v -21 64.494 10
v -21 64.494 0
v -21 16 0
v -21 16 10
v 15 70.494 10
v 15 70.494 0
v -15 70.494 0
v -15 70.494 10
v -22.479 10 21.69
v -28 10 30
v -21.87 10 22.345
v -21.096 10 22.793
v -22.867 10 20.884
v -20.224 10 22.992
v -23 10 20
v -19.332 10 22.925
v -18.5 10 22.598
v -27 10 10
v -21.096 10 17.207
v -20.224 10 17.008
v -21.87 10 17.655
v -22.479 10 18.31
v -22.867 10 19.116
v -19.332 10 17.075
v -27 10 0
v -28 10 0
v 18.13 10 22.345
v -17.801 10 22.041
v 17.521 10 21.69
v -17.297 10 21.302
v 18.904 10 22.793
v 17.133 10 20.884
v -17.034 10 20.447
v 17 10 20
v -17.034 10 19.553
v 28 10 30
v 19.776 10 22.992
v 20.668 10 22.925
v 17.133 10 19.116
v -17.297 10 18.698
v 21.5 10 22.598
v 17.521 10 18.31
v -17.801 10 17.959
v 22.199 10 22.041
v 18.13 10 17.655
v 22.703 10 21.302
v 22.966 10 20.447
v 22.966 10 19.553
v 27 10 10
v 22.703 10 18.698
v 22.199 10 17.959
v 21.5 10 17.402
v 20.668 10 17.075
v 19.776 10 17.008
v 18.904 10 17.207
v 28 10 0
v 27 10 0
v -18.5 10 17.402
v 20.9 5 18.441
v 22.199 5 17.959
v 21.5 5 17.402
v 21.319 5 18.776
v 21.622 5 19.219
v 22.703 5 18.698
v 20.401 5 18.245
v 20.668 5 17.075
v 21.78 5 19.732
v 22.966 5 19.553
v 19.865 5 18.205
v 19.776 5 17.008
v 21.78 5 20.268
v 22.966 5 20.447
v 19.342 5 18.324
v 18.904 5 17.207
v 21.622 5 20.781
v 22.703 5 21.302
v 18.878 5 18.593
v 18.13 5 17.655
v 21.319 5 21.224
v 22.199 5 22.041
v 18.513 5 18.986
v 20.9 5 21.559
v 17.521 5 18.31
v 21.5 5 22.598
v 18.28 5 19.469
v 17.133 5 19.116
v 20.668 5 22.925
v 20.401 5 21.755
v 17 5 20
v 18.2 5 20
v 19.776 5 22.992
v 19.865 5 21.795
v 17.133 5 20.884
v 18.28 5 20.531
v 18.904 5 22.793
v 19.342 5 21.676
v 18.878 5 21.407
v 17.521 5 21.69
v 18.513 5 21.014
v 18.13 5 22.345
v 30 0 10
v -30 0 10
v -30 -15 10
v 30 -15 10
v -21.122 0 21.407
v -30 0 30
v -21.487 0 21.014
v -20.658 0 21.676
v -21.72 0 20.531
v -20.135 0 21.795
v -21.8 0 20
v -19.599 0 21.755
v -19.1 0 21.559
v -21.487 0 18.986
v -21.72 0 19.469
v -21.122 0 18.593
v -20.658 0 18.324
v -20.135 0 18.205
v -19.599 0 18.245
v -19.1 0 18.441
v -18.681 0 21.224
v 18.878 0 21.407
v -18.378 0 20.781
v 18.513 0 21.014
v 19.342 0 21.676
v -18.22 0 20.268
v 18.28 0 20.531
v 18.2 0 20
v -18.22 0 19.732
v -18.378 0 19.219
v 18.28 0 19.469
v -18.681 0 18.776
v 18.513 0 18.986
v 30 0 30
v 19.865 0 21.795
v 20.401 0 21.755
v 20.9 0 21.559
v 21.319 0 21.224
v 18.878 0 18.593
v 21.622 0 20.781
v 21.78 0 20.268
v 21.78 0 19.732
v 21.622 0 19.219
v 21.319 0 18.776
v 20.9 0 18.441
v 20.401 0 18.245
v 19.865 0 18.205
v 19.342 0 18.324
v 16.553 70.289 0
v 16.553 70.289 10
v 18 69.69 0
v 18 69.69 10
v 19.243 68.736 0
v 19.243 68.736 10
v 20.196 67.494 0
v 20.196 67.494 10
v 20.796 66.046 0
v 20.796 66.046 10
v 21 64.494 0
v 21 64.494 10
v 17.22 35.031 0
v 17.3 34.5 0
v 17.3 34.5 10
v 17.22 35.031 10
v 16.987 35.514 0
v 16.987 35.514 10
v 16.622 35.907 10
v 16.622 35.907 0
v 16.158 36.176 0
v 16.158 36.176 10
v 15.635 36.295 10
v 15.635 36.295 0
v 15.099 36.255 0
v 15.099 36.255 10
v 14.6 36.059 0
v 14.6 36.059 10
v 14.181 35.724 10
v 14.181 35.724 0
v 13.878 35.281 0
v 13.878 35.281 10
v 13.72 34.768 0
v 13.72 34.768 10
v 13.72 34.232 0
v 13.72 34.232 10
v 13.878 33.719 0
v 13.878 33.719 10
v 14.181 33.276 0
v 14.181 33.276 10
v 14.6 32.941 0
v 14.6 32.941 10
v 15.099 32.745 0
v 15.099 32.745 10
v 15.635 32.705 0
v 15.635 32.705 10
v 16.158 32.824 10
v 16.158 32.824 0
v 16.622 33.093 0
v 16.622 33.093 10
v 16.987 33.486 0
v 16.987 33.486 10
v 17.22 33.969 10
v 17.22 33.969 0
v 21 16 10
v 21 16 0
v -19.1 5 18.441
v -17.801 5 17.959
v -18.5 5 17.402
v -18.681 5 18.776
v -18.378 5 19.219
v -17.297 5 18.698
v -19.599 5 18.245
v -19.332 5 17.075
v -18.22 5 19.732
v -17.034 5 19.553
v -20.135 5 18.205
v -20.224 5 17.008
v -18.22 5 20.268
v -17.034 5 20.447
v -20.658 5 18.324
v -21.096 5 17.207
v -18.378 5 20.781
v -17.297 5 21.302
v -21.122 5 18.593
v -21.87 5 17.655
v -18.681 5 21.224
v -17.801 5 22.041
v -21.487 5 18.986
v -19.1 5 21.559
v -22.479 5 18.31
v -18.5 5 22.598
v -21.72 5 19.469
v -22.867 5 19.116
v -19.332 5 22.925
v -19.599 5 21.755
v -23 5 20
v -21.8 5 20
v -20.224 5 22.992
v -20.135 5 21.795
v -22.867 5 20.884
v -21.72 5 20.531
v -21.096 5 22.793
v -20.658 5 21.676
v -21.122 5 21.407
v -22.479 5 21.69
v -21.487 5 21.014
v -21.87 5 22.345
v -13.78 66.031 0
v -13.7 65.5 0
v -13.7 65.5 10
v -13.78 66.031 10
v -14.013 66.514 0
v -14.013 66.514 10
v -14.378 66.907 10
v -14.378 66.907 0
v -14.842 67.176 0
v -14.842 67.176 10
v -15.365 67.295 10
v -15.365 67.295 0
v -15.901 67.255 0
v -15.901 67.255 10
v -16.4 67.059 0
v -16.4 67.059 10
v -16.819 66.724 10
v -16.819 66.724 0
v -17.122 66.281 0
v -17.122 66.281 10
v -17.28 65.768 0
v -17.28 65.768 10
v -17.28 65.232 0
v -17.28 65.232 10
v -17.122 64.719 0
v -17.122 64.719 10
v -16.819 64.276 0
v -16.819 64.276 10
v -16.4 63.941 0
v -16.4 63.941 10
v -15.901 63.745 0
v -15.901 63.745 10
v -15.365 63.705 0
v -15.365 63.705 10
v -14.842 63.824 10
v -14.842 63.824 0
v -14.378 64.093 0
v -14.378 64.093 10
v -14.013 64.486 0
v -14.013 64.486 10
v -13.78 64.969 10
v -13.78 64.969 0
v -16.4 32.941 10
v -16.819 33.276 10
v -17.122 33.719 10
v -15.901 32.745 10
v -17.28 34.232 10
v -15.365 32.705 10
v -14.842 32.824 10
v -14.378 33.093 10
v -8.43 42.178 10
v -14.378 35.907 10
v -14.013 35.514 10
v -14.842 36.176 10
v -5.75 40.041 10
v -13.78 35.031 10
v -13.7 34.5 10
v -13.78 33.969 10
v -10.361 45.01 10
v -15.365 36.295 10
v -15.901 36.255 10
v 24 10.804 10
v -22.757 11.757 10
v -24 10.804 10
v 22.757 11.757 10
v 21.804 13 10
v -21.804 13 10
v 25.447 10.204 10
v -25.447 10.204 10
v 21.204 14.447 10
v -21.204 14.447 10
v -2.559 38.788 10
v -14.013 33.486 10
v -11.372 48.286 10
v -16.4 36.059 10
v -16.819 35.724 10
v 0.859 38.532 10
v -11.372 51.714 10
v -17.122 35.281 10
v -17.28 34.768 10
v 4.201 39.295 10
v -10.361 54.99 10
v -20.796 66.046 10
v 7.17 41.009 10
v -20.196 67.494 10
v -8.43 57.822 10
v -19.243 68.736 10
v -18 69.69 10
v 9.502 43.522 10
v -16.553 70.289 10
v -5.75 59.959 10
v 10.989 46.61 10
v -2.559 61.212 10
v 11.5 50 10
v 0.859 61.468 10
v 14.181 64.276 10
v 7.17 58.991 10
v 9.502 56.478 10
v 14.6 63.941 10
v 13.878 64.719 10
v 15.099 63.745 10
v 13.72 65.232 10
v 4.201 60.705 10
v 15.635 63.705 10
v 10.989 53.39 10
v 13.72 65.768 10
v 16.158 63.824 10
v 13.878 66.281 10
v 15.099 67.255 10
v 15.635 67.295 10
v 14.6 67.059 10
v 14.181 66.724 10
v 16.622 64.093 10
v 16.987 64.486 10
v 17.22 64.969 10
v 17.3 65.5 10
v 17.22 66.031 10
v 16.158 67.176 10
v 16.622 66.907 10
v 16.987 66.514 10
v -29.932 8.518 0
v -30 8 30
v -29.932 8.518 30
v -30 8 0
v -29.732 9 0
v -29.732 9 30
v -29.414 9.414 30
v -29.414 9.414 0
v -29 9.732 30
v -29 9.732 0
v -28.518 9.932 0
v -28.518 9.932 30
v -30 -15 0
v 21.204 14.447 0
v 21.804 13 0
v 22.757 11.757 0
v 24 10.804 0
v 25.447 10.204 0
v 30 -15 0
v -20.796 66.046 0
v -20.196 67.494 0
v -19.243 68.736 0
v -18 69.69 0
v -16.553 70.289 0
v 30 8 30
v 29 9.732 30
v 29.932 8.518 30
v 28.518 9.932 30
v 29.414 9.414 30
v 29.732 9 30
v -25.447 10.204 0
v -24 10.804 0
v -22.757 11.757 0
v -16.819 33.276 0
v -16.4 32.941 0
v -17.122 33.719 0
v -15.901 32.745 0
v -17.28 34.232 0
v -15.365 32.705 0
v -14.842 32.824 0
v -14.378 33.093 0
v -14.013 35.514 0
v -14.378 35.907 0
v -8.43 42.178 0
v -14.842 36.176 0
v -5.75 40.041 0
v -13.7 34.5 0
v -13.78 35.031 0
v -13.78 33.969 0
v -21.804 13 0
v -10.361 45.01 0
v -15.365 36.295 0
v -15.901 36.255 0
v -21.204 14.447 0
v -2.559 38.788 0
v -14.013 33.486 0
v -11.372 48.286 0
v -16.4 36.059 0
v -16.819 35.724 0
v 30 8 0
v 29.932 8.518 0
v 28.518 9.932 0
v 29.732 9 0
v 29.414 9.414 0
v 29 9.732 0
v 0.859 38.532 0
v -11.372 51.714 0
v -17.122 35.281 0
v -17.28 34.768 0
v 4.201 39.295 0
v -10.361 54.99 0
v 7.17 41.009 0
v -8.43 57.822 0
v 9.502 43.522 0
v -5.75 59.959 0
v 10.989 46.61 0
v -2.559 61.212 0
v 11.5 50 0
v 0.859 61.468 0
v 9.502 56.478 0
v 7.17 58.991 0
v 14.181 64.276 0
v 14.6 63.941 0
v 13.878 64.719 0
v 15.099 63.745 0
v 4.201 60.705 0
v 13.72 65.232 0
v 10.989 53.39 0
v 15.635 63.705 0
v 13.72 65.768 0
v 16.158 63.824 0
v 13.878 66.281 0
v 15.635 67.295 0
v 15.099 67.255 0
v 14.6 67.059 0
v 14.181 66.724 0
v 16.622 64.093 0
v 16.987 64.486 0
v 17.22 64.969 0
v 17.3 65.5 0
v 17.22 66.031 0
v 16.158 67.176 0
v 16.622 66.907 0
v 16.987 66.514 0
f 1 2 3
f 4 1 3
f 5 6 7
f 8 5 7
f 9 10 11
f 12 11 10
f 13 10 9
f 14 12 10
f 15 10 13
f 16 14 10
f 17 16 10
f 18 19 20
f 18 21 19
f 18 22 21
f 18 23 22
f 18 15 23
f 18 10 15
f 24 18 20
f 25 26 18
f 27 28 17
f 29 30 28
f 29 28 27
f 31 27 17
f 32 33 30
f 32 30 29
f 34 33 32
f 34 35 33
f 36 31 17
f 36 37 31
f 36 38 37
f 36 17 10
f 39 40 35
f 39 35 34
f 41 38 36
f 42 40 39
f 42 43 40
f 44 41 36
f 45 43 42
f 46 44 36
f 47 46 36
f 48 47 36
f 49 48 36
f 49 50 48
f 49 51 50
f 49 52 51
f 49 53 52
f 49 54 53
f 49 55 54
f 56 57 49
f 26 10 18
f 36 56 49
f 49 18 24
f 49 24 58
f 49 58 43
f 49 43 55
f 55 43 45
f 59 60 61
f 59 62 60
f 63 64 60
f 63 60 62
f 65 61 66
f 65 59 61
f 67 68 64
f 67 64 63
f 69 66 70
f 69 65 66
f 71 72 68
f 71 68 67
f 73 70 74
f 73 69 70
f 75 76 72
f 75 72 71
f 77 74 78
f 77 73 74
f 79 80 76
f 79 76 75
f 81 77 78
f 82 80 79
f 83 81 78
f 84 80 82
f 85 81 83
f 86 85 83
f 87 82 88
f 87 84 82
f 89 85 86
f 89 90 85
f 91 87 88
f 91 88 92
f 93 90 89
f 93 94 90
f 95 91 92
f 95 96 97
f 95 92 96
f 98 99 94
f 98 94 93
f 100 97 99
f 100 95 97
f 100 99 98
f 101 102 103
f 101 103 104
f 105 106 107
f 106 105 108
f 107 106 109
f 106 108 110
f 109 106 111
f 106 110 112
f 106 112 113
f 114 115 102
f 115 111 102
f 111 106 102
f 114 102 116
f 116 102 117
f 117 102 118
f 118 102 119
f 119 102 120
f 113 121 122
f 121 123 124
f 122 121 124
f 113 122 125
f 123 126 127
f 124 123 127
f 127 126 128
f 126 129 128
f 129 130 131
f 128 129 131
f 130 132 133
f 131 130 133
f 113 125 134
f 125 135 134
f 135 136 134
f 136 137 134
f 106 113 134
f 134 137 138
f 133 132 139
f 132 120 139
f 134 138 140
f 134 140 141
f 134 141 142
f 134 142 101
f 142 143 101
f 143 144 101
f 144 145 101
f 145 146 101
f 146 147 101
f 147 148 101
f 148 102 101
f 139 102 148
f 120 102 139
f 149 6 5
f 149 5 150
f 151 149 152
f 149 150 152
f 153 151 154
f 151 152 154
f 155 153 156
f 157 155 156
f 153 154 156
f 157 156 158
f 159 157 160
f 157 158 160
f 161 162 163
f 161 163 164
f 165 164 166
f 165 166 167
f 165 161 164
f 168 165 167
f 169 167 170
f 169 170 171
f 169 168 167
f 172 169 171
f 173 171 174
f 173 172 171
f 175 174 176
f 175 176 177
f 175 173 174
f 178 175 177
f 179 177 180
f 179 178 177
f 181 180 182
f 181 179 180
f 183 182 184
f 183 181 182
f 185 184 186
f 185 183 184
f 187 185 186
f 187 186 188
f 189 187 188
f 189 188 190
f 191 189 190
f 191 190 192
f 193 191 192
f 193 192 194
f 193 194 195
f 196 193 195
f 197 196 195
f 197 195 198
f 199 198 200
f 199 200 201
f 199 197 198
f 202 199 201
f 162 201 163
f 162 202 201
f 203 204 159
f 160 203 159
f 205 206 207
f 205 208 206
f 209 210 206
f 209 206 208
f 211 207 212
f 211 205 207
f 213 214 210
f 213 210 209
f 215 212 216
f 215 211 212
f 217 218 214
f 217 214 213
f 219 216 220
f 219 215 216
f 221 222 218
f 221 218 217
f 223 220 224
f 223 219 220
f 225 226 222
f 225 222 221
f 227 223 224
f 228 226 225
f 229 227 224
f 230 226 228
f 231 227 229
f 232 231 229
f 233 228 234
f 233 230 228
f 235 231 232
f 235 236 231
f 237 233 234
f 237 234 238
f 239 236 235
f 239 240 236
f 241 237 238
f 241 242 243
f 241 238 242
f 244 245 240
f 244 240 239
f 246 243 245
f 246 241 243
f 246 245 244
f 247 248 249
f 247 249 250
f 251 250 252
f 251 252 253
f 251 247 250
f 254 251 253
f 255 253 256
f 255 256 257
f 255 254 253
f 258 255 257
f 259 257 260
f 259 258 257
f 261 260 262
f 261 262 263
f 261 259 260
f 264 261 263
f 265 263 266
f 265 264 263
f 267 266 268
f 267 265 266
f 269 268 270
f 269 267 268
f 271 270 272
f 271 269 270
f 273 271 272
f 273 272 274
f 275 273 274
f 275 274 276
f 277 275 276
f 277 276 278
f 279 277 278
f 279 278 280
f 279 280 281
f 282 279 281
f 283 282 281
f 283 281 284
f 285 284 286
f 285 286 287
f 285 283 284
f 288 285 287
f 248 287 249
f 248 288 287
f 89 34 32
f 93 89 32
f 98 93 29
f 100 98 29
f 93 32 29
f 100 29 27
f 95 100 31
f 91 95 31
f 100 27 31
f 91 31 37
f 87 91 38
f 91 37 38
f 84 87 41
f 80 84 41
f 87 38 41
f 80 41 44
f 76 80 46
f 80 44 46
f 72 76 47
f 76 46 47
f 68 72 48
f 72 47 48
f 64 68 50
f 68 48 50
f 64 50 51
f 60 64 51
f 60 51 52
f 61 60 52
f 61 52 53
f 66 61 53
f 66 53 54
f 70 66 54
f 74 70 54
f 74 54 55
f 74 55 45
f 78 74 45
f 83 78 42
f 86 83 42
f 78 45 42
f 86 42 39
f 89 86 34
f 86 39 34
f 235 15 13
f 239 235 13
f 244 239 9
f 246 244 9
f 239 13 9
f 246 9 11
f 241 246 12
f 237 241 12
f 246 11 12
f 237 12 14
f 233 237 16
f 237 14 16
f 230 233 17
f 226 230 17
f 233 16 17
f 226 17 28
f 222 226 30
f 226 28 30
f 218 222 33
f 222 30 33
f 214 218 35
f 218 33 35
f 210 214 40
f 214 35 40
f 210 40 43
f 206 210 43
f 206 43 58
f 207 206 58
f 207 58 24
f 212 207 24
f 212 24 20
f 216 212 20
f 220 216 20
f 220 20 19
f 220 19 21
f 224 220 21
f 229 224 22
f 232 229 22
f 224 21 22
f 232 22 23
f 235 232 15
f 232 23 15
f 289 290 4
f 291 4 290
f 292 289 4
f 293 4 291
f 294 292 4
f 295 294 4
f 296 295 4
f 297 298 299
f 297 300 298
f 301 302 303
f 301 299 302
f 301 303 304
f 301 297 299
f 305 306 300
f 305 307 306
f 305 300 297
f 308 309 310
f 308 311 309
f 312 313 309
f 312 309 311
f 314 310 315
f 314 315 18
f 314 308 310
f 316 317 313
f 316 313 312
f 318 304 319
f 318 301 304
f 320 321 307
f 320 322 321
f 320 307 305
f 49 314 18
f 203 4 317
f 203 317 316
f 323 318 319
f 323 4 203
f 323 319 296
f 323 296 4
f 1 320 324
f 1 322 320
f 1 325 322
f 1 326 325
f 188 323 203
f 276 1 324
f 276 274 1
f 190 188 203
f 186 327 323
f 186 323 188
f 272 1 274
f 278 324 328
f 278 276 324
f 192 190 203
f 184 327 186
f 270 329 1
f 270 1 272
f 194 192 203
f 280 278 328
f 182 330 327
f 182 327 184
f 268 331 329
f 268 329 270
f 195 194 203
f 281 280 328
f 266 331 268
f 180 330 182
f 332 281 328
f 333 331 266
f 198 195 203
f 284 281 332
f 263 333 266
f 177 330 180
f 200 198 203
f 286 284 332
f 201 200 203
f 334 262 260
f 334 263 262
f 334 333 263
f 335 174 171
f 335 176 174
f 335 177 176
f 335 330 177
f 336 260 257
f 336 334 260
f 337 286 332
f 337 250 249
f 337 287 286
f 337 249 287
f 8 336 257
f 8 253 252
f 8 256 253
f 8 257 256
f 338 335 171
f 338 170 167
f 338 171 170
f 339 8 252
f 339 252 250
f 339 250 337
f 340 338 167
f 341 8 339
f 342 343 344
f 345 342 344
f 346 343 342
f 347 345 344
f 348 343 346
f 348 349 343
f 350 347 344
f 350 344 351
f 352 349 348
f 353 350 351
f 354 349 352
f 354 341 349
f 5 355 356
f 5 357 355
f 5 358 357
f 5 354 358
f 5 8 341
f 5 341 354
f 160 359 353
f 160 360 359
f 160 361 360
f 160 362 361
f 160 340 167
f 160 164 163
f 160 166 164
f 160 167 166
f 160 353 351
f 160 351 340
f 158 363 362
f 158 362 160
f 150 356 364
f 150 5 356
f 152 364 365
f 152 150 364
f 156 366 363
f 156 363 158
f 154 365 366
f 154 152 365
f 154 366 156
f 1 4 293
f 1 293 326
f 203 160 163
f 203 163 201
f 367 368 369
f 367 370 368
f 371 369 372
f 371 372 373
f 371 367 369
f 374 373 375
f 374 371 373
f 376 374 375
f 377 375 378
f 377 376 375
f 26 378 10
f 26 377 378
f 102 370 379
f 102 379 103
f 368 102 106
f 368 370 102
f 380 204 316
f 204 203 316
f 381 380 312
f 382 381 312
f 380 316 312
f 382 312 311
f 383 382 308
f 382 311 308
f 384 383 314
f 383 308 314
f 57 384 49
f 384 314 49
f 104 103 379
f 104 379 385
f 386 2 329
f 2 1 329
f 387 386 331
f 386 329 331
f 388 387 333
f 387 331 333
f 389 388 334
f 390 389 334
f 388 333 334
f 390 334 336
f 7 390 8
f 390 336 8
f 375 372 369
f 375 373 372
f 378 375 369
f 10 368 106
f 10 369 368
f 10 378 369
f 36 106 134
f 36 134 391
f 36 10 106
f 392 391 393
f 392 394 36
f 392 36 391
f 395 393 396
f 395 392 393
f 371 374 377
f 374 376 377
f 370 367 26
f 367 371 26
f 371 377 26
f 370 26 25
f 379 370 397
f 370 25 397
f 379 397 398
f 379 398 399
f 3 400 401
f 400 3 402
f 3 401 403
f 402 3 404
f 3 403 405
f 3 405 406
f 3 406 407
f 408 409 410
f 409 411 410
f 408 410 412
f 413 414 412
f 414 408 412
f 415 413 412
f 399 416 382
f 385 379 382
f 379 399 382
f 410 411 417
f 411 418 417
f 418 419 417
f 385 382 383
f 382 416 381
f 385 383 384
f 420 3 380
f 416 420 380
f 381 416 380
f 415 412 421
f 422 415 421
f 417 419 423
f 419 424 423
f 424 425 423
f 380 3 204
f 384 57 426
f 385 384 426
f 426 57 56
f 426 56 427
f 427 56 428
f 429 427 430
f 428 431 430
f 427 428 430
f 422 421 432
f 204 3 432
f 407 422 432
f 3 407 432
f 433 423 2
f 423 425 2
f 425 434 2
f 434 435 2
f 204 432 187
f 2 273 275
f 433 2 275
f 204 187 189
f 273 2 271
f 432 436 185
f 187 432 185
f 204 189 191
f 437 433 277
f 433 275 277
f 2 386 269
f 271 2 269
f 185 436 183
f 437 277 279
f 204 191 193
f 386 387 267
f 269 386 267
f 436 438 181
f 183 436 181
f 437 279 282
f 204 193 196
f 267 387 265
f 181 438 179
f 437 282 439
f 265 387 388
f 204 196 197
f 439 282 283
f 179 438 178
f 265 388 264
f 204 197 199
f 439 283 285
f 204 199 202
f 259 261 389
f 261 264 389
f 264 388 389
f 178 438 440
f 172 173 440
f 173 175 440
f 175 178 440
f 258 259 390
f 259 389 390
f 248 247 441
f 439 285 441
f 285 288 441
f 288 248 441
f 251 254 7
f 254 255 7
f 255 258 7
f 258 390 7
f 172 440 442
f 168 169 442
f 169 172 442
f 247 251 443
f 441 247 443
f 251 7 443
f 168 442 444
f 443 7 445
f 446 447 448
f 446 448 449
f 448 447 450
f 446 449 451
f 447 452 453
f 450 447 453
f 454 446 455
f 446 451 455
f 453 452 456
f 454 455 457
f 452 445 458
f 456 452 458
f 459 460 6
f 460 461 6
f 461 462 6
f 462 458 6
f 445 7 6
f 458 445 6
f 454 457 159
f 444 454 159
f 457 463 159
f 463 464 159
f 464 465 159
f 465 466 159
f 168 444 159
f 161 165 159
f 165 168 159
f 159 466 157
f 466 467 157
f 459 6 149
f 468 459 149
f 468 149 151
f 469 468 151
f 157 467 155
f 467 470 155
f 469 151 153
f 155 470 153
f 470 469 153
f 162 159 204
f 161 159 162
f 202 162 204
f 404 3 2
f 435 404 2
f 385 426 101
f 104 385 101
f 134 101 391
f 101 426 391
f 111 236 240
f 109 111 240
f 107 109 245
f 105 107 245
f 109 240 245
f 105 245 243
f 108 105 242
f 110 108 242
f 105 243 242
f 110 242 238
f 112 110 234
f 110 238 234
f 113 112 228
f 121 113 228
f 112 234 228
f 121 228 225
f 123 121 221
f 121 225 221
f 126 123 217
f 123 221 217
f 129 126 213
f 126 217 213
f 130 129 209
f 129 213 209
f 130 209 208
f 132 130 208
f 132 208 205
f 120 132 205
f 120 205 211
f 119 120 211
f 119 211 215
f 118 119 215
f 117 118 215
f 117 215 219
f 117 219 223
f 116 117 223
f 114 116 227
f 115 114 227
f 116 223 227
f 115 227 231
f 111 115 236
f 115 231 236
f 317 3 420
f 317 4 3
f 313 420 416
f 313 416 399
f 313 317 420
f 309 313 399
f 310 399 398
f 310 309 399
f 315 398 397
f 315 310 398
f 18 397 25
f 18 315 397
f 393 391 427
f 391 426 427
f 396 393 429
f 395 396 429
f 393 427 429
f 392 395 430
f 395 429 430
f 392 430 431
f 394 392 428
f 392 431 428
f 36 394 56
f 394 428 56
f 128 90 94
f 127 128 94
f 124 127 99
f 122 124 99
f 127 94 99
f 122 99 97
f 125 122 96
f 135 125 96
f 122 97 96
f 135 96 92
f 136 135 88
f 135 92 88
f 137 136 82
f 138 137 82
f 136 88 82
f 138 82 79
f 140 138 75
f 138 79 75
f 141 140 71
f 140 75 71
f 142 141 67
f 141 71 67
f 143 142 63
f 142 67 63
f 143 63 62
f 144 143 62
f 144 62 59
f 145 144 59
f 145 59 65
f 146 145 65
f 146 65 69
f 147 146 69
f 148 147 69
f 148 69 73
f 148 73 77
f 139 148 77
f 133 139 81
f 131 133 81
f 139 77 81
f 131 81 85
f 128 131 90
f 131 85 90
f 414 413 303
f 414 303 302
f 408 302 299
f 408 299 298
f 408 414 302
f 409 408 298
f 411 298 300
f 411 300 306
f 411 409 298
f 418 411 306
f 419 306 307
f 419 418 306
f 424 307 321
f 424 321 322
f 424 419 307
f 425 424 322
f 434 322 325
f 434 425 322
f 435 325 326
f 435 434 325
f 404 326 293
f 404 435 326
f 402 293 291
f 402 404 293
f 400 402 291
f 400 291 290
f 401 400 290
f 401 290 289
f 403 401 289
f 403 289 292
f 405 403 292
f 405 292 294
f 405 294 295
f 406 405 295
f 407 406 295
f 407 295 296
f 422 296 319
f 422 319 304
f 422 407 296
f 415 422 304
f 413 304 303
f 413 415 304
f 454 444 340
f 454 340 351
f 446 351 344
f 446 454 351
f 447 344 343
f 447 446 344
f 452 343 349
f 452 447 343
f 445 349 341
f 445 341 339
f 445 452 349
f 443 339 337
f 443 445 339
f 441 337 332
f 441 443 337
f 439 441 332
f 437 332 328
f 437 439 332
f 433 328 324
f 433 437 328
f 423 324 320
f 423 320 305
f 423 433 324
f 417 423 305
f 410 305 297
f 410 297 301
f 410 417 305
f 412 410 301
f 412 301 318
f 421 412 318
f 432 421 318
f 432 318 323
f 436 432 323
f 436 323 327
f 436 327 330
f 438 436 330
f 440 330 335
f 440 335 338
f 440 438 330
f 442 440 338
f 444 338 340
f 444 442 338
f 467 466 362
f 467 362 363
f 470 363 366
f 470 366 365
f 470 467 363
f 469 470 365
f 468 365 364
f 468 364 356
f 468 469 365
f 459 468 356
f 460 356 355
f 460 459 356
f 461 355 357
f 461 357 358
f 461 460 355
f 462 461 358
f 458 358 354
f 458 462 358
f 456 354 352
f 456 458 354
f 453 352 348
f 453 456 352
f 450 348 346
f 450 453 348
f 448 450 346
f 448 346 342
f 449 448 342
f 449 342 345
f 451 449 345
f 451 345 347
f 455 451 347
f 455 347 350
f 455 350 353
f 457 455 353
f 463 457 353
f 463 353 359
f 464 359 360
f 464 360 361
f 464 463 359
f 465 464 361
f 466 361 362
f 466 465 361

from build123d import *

# Parameters (mm, degrees)
SKETCH_R        = 1.8
SKETCH_R_2      = 11.5
PAD_DEPTH       = 10
SKETCH001_W     = 60
SKETCH001_H     = 10
PAD001_DEPTH    = 20
SKETCH002_R     = 3
POCKET_DEPTH    = 5
SKETCH003_R     = 1.8
POCKET001_DEPTH = 5
SKETCH004_W     = 60
SKETCH004_H     = 10
PAD002_DEPTH    = 15
FILLET_R        = 6
FILLET001_R     = 2


with BuildPart() as part:
    # Sketch → Pad (new body)
    with BuildSketch(Plane.XY):
        Polygon((21, 10), (21, 70.493559), (-21, 70.493559), (-21, 10), (-30, 10), (-30, 0), (30, 0), (30, 10), align=None)
        with Locations((15.5, 34.5)):
            Circle(SKETCH_R, mode=Mode.SUBTRACT)
        with Locations((-15.5, 34.5)):
            Circle(SKETCH_R, mode=Mode.SUBTRACT)
        with Locations((0, 50)):
            Circle(SKETCH_R_2, mode=Mode.SUBTRACT)
        with Locations((15.5, 65.5)):
            Circle(SKETCH_R, mode=Mode.SUBTRACT)
        with Locations((-15.5, 65.5)):
            Circle(SKETCH_R, mode=Mode.SUBTRACT)
    extrude(amount=PAD_DEPTH)

    # Sketch001 (on Face15 of Pad) → Pad001 (join)
    with BuildSketch(Plane.XY.offset(10)):
        with Locations((0, 5)):
            Rectangle(SKETCH001_W, SKETCH001_H)
    extrude(amount=PAD001_DEPTH)

    # Sketch002 (on Face6 of Pad001) → Pocket (cut)
    with BuildSketch(Plane(origin=(0, 10, 0), x_dir=(-1, 0, 0), z_dir=(0, 1, 0))):
        with Locations((-20, 20)):
            Circle(SKETCH002_R)
        with Locations((20, 20)):
            Circle(SKETCH002_R)
    extrude(amount=-POCKET_DEPTH, mode=Mode.SUBTRACT)

    # Sketch003 (on Face23 of Pocket) → Pocket001 (cut)
    with BuildSketch(Plane(origin=(0, 5, 0), x_dir=(-1, 0, 0), z_dir=(0, 1, 0))):
        with Locations((-20, 20)):
            Circle(SKETCH003_R)
        with Locations((20, 20)):
            Circle(SKETCH003_R)
    extrude(amount=-POCKET001_DEPTH, mode=Mode.SUBTRACT)

    # Sketch004 (on Face11 of Pocket001) → Pad002 (join)
    with BuildSketch(Plane.XZ):
        with Locations((0, 5)):
            Rectangle(SKETCH004_W, SKETCH004_H)
    extrude(amount=PAD002_DEPTH)

    # Fillet
    fillet_edges = [part.edges().sort_by_distance(p)[0] for p in [
        (-21, 70.493559, 5),
        (21, 70.493559, 5),
        (-21, 10, 5),
        (21, 10, 5),
    ]]
    fillet(fillet_edges, radius=FILLET_R)

    # Fillet001
    fillet001_edges = [part.edges().sort_by_distance(p)[0] for p in [
        (30, 10, 20),
        (-30, 10, 20),
    ]]
    fillet(fillet001_edges, radius=FILLET001_R)


solid = part.part
